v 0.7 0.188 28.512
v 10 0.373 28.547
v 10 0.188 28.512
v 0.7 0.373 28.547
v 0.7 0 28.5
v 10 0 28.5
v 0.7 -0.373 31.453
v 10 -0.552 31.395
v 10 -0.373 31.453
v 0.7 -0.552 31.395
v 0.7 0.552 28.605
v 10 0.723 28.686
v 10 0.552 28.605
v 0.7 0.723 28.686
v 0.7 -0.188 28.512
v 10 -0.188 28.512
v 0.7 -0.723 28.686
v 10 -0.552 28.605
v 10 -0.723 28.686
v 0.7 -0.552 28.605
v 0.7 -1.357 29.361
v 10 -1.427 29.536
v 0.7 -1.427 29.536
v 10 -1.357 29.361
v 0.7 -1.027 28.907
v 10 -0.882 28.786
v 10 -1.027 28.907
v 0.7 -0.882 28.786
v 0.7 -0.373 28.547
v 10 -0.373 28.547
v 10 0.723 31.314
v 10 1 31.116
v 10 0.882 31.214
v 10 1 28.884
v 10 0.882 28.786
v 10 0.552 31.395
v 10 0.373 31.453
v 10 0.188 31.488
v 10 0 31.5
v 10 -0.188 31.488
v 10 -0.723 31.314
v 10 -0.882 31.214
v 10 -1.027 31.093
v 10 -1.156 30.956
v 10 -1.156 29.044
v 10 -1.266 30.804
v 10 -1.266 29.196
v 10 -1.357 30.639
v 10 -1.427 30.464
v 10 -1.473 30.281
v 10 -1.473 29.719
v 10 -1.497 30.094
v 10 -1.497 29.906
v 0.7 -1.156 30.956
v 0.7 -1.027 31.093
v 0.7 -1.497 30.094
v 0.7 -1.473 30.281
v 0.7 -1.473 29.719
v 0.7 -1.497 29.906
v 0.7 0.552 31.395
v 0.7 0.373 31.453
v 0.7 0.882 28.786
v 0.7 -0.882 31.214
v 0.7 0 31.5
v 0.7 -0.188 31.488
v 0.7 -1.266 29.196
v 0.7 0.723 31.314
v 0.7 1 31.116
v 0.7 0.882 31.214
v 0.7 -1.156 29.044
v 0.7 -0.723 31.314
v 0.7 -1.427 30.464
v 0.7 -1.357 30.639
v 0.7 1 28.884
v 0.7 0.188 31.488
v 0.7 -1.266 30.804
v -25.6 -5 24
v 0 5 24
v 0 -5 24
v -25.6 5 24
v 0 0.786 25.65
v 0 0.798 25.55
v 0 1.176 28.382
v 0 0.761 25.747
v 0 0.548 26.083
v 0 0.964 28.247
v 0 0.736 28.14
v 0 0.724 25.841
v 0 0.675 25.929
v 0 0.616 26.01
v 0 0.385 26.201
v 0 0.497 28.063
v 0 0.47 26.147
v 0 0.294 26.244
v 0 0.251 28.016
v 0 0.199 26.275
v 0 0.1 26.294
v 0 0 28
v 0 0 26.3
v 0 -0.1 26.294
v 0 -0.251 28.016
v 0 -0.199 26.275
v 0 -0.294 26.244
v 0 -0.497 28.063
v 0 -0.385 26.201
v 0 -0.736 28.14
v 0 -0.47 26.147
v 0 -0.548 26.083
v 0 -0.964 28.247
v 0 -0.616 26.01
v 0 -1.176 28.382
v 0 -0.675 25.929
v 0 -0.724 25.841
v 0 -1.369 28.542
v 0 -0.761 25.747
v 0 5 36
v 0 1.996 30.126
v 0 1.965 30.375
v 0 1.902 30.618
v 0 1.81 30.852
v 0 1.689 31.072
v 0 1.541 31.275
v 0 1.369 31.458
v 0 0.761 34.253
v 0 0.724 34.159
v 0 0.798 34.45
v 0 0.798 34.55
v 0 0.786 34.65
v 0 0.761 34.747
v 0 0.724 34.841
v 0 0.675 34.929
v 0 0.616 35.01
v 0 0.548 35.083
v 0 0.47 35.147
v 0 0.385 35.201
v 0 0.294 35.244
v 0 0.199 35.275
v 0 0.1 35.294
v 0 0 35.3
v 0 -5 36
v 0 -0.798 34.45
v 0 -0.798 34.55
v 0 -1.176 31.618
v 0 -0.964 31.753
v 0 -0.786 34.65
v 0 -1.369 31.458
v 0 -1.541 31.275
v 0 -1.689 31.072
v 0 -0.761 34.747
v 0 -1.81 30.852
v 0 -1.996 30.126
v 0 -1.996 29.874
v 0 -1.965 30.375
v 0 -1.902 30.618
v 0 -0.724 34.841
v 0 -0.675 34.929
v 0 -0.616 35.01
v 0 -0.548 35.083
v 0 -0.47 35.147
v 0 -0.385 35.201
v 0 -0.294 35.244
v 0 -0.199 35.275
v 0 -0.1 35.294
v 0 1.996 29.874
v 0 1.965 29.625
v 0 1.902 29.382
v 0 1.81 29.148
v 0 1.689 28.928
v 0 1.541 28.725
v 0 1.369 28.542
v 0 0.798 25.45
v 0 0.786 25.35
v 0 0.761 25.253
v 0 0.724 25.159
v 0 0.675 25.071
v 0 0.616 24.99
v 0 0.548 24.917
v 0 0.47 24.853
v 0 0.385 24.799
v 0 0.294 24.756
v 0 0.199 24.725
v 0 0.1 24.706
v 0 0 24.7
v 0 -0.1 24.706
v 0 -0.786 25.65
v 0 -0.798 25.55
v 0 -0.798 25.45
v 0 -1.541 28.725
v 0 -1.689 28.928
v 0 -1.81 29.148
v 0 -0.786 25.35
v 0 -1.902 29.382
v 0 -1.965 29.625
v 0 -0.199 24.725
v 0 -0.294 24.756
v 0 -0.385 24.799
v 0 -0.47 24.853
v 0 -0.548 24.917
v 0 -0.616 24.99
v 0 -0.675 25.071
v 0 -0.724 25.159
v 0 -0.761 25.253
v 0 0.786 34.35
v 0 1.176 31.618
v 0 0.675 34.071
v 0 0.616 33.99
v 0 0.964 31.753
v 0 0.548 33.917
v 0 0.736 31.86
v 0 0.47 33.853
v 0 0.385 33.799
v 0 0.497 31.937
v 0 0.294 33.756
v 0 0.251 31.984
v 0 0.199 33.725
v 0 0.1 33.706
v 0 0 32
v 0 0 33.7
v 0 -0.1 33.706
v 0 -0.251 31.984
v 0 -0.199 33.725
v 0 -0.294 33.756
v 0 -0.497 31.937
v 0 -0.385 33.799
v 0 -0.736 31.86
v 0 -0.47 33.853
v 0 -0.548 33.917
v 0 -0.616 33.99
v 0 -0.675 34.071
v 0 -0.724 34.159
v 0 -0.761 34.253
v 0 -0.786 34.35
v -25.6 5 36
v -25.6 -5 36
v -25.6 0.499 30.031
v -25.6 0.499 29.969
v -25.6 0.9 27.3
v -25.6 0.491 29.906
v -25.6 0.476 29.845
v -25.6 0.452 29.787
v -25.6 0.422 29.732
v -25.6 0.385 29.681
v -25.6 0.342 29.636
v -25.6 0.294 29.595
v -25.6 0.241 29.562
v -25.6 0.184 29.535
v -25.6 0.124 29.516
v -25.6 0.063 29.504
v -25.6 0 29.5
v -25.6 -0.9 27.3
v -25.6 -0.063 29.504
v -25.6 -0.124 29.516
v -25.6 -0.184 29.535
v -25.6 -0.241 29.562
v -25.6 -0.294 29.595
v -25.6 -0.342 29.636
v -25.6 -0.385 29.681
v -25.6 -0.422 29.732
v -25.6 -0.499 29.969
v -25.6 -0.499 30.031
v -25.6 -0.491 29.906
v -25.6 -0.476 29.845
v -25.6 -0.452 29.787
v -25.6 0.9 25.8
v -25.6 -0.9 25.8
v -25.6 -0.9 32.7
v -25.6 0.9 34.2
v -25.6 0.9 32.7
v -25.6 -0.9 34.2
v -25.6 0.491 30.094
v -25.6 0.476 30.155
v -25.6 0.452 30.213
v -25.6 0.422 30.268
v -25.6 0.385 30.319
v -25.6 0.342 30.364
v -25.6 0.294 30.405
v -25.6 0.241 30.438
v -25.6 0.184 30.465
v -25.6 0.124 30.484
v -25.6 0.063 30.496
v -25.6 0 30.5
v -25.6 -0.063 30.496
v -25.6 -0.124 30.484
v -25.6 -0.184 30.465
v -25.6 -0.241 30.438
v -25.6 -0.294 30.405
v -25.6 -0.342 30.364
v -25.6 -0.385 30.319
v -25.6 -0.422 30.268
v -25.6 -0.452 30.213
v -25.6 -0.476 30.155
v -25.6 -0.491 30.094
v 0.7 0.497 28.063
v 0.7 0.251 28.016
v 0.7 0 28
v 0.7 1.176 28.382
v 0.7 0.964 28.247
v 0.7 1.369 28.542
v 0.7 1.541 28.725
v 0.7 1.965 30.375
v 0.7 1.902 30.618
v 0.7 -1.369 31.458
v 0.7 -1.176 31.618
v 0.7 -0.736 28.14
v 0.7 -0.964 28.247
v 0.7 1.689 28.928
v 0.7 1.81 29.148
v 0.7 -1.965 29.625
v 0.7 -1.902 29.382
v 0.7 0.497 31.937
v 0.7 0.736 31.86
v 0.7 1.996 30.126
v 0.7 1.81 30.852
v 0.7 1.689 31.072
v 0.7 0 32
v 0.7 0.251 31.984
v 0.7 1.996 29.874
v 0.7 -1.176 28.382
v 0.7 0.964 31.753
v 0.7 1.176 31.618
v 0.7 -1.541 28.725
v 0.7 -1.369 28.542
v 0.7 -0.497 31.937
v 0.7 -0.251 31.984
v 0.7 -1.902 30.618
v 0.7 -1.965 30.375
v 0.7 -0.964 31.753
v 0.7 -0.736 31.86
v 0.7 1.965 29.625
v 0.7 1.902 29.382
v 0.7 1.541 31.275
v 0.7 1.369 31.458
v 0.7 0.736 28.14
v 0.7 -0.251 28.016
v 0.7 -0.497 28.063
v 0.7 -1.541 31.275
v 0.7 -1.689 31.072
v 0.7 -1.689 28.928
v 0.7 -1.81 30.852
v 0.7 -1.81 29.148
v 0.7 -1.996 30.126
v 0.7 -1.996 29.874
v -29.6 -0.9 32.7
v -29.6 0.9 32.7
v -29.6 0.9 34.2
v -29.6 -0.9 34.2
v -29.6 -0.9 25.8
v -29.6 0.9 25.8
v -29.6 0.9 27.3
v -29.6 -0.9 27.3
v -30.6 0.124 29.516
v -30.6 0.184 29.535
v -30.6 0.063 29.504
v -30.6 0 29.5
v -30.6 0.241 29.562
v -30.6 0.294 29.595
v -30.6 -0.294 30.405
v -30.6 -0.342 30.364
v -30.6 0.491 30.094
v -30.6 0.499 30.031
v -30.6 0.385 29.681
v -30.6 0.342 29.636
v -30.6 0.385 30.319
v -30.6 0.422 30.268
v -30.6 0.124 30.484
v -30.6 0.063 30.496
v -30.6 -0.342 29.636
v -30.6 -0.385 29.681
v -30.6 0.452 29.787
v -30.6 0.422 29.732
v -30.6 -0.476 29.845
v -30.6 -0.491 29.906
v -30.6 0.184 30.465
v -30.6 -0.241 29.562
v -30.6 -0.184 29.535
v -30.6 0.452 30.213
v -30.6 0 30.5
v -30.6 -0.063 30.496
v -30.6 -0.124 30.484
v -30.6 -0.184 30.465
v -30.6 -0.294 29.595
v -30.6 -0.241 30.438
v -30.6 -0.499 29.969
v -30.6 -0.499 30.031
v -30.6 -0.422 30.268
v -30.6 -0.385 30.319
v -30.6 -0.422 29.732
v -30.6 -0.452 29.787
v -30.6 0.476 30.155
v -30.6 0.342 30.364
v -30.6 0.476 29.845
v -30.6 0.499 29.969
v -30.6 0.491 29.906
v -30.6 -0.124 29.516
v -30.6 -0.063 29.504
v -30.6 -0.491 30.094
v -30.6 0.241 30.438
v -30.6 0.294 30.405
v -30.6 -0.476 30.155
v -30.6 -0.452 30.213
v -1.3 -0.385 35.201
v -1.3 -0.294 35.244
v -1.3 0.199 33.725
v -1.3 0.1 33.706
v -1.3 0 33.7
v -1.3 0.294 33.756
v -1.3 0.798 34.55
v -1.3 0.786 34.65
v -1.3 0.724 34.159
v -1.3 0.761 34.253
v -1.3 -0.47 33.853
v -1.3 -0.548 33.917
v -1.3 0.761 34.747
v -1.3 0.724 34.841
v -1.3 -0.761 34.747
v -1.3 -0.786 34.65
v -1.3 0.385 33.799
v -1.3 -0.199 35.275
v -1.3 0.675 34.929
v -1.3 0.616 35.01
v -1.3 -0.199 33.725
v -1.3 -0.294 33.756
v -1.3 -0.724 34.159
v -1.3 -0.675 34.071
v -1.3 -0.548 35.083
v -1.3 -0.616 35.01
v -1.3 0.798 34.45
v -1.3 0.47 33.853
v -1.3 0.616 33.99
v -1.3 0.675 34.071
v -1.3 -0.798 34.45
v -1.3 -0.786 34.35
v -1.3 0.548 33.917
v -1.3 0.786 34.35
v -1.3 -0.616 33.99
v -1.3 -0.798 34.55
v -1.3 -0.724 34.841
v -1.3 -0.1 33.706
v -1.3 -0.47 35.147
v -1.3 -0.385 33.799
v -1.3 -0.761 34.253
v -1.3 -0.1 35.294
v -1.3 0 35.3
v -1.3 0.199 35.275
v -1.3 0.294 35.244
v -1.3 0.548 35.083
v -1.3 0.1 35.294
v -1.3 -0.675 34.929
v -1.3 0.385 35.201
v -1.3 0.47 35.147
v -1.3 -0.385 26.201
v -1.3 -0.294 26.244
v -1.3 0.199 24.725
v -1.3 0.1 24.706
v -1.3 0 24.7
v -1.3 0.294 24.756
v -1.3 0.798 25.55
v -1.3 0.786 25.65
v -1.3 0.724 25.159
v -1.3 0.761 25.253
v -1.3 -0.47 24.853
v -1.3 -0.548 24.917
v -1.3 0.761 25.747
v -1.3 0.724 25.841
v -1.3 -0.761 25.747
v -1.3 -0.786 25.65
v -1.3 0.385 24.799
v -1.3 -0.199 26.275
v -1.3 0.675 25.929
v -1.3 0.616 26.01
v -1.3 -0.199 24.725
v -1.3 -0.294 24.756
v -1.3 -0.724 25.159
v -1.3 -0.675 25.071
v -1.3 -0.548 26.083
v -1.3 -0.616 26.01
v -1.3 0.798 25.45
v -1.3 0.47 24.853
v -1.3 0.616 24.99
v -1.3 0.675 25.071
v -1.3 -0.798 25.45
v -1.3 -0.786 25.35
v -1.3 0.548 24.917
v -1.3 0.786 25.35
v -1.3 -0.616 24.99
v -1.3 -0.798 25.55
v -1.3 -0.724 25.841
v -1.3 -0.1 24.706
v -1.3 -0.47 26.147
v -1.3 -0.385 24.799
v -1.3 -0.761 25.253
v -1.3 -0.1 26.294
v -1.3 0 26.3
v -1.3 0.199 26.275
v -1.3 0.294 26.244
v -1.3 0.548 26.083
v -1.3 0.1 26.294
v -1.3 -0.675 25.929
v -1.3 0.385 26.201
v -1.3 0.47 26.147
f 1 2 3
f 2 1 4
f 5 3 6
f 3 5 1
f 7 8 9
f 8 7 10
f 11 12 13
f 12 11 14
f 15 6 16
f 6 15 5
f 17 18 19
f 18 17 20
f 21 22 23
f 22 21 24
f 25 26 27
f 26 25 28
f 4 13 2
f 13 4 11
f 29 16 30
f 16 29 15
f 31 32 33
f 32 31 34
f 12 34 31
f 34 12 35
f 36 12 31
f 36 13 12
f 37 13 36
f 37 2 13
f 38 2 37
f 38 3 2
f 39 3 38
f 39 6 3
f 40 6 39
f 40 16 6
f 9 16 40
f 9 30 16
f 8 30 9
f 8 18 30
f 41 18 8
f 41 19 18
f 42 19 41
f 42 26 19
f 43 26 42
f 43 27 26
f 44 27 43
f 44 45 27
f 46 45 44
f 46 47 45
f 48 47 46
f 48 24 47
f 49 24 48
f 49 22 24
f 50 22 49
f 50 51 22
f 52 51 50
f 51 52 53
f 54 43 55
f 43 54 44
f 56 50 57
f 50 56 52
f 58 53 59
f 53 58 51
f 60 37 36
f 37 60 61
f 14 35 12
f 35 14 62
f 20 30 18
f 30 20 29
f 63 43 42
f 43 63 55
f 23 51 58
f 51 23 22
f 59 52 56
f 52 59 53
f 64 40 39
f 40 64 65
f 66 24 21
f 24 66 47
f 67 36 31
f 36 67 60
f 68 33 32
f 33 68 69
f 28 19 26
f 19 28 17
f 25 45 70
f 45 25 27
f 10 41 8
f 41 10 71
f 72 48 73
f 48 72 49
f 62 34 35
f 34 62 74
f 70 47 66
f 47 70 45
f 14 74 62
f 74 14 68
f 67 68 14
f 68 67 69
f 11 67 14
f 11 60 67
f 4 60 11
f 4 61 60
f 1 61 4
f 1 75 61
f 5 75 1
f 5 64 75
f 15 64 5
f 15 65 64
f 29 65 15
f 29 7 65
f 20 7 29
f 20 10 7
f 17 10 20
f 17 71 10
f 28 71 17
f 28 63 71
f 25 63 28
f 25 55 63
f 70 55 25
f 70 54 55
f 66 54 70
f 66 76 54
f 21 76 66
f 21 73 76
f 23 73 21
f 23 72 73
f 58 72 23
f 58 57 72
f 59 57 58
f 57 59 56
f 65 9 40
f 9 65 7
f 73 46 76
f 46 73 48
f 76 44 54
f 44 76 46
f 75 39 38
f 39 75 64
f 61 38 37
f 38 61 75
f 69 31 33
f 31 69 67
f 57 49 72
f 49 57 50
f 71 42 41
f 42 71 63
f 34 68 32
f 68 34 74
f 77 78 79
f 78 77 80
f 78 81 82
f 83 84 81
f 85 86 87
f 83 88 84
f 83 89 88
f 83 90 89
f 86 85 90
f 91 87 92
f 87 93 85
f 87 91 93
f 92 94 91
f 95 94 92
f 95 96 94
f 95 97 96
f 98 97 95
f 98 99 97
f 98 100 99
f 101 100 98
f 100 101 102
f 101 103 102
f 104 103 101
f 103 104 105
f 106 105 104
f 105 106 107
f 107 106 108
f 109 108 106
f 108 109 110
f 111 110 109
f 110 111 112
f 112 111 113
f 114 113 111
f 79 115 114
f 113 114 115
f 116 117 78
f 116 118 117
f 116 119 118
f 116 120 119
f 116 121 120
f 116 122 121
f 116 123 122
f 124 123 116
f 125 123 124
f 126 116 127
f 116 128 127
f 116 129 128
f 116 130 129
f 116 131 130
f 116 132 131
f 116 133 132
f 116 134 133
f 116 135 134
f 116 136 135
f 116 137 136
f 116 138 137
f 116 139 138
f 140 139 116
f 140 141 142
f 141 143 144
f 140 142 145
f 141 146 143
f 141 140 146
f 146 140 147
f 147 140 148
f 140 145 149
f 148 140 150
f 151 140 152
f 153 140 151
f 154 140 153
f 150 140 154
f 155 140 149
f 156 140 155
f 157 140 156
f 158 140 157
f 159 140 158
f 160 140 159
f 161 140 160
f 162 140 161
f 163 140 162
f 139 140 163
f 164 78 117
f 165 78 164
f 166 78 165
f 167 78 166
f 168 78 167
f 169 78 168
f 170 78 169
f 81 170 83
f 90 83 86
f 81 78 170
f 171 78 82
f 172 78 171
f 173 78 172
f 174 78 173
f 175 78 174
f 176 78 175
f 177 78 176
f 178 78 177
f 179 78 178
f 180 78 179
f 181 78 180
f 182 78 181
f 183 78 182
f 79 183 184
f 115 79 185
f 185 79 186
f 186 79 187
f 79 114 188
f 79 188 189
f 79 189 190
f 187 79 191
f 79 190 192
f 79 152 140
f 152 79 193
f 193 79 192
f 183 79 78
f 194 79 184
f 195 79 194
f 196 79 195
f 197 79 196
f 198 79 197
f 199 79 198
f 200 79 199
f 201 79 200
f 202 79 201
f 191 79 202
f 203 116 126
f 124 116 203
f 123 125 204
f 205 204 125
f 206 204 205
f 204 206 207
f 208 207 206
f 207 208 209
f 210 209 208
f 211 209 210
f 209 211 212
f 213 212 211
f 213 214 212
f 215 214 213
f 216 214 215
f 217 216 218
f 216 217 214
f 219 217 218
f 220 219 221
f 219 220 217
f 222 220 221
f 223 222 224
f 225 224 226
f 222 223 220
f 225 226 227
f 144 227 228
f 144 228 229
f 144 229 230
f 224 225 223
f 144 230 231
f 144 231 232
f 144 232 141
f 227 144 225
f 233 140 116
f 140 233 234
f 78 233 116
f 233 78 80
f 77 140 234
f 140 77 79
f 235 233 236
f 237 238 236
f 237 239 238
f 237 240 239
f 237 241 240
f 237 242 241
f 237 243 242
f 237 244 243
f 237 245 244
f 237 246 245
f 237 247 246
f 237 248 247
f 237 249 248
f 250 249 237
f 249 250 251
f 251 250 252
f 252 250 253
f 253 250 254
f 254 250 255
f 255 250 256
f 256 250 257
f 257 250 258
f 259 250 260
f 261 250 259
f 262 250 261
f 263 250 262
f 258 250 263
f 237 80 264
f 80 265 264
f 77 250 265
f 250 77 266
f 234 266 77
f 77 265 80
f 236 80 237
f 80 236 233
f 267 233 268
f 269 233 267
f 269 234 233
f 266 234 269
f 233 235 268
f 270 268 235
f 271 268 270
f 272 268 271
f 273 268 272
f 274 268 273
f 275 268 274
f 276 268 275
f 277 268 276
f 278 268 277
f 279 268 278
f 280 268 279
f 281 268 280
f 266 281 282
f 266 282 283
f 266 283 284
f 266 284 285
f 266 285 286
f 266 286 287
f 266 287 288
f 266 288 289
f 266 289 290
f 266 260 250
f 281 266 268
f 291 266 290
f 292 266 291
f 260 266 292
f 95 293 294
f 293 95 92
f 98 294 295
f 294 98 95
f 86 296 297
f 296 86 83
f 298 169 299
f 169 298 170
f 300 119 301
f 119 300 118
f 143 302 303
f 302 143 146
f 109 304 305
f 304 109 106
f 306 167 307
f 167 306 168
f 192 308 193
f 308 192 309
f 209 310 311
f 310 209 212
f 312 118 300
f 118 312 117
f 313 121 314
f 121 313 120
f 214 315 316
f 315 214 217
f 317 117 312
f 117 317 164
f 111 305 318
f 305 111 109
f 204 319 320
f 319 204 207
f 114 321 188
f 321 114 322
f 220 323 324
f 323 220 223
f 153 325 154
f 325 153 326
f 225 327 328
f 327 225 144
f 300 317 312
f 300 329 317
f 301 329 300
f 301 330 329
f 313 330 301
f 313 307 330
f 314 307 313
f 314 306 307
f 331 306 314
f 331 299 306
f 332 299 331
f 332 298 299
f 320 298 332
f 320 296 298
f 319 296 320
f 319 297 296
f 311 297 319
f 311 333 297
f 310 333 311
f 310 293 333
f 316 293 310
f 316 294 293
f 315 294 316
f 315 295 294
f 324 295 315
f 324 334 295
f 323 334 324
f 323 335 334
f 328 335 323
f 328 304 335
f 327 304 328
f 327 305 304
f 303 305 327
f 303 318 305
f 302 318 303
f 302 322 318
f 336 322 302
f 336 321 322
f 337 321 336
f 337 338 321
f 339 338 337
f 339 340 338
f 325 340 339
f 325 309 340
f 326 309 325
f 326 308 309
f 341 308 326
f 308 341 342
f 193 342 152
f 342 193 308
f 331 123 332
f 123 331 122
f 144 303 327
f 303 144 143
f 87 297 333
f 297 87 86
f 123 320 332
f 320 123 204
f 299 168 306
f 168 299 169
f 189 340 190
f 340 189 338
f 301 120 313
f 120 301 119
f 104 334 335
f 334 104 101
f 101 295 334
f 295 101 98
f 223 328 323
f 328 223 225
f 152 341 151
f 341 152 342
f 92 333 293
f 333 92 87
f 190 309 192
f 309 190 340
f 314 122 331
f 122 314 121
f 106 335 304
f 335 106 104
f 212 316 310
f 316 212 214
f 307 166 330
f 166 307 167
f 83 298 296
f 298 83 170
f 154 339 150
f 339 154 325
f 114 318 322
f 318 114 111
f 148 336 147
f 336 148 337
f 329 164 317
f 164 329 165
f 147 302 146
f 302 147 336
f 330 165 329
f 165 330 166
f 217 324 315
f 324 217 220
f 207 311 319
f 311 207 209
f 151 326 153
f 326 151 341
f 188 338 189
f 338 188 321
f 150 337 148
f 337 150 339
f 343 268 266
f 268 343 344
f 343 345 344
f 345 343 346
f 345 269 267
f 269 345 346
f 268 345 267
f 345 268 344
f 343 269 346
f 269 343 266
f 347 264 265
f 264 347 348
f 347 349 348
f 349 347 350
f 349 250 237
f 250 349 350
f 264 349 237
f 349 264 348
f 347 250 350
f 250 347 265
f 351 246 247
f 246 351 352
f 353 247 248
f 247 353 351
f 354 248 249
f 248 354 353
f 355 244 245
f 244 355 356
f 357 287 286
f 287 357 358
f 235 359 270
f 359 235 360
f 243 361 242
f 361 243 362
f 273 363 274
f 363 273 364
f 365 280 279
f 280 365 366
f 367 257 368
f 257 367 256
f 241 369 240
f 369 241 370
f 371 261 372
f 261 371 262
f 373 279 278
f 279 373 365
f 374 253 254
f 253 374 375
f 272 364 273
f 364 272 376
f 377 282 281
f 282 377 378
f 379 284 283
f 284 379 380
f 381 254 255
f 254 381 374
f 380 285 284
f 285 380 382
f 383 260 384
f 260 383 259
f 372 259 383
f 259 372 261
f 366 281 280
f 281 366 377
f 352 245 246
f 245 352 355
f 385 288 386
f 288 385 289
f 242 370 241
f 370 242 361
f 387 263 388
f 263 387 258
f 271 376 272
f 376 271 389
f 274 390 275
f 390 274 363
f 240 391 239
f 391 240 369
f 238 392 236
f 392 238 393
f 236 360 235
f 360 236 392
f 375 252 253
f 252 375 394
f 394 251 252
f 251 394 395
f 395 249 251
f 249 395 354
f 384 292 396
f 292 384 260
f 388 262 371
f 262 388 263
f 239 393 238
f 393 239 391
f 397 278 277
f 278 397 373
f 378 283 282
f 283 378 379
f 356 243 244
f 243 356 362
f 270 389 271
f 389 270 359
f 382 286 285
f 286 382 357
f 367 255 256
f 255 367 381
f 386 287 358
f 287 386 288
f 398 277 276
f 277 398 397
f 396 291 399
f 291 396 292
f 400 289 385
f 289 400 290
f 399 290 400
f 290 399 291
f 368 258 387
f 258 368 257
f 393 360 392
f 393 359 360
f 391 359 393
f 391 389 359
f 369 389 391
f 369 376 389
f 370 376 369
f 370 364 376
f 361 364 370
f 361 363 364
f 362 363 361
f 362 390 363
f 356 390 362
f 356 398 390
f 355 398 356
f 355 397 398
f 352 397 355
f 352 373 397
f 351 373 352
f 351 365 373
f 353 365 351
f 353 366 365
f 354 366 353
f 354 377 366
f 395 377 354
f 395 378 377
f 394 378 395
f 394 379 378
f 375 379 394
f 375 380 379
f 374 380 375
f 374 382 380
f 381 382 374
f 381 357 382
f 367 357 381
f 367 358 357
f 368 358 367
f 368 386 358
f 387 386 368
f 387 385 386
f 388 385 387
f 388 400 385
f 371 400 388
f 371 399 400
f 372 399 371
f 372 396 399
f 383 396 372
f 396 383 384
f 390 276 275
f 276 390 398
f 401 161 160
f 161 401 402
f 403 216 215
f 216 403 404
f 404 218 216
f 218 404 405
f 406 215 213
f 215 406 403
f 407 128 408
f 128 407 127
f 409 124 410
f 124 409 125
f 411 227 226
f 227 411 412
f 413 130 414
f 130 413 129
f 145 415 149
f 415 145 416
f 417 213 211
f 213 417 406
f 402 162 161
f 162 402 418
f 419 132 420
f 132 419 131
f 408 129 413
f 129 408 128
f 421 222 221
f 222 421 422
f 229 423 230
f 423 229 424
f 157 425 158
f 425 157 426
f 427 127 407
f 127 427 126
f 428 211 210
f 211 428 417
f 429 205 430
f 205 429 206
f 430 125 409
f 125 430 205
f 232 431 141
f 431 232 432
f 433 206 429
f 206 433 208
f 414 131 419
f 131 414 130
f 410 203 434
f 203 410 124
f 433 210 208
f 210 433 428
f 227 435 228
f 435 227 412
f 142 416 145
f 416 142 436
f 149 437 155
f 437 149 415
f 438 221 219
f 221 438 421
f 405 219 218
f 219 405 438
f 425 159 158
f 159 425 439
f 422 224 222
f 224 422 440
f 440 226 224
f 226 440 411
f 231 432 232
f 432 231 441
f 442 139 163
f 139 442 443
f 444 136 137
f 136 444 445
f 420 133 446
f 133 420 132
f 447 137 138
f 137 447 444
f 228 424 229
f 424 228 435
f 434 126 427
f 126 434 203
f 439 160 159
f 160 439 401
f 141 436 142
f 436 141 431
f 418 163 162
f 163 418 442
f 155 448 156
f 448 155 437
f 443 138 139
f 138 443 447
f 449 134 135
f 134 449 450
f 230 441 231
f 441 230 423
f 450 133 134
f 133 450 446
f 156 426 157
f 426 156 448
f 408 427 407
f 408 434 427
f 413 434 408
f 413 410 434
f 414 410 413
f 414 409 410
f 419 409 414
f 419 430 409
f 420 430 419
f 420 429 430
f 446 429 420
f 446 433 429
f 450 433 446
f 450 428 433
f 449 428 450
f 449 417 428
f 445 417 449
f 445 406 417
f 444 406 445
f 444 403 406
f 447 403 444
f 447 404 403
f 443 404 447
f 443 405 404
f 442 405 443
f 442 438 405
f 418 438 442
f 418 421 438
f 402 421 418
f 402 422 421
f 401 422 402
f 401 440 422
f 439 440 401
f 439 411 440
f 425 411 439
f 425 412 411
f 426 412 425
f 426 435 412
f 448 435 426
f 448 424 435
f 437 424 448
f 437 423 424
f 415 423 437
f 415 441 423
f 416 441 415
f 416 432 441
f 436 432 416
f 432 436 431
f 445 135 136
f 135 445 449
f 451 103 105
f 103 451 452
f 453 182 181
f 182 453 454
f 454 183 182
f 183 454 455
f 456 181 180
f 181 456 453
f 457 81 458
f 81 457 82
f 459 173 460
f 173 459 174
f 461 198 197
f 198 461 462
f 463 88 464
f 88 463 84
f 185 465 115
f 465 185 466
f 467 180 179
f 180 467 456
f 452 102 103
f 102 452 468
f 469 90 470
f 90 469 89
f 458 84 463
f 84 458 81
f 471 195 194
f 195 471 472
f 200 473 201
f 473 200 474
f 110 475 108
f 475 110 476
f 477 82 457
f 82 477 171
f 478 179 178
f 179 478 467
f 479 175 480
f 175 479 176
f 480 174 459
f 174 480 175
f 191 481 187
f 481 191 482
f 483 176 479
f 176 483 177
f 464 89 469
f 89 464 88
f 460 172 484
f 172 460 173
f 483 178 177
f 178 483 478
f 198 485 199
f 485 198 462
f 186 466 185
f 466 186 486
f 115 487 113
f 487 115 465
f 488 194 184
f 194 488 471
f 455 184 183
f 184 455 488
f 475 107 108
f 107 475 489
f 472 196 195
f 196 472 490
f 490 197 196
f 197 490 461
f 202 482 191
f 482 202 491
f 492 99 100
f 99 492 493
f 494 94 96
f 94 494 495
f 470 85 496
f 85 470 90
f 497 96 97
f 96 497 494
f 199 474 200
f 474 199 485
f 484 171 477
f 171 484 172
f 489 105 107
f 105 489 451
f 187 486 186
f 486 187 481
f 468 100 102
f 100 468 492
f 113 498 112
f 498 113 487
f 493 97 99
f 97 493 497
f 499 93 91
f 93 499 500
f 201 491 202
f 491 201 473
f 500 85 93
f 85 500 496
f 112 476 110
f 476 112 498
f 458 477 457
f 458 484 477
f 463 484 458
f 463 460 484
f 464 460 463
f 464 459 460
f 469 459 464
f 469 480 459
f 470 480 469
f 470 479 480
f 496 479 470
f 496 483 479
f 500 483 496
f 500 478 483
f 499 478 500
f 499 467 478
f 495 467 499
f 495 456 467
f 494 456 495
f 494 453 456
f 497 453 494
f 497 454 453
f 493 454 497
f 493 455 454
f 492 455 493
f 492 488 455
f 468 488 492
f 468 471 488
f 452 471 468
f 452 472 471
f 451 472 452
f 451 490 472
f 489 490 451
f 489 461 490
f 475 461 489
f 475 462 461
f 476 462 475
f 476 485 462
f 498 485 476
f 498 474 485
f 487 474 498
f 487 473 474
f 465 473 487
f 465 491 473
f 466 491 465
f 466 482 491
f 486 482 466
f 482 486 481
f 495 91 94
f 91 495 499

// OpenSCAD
$fn = 50;

difference() {
	union() {
		translate(v = [0, 0, 30]) {
			rotate(a = [0, 90, 0]) {
				difference() {
					union() {
						translate(v = [0, 0, 0.7]) {
							rotate(a = [0, 0, 0]) {
								difference() {
									union() {
										cylinder(h = 9.3, r = 1.5);
									}
									union() {
										translate(v = [-6.0, 1.0, -1]) {
											cube(size = [12, 12, 11.3]);
										}
									}
								}
							}
						}
						translate(v = [-6.0, -5.0, -9]) {
							cube(size = [12, 10, 9]);
						}
						translate(v = [-6.0, -5.0, -25.6]) {
							cube(size = [12, 10, 16.6]);
						}
						cylinder(h = 0.7, r = 2.0);
						translate(v = [-4.2, -0.9, -29.6]) {
							cube(size = [1.5, 1.8, 4]);
						}
						translate(v = [2.7, -0.9, -29.6]) {
							cube(size = [1.5, 1.8, 4]);
						}
						translate(v = [0, 0, -30.6]) {
							cylinder(h = 5, r = 0.5);
						}
					}
					union() {
						translate(v = [-4.5, 0, -1.3]) {
							cylinder(h = 1.31, r = 0.8);
						}
						translate(v = [4.5, 0, -1.3]) {
							cylinder(h = 1.31, r = 0.8);
						}
					}
				}
			}
		}
	}
	union();
}
